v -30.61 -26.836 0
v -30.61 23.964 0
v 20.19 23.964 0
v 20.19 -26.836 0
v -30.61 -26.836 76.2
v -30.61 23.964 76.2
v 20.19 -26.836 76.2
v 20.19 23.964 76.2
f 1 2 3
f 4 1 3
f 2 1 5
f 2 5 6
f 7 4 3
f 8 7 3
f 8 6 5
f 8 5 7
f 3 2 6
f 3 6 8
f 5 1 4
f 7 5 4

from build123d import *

# Parameters (mm, degrees)
F0_W     = 101.6
F0_H     = 101.6
F1_DEPTH = 152.4
F3_W     = 50.8
F3_H     = 50.8
F4_DEPTH = 76.2


with BuildPart() as f1:
    # F0 (on Top) → F1 (new body)
    with BuildSketch(Plane.XY):
        with Locations((0.5169101059, 6.4923027378)):
            Rectangle(F0_W, F0_H)
    extrude(amount=F1_DEPTH)


with BuildPart() as f4:
    # F3 (on Top) → F4 (new body)
    with BuildSketch(Plane.XY):
        with Locations((-5.2103567868, -1.4362401626)):
            Rectangle(F3_W, F3_H)
    extrude(amount=F4_DEPTH)


solid = f4.part
